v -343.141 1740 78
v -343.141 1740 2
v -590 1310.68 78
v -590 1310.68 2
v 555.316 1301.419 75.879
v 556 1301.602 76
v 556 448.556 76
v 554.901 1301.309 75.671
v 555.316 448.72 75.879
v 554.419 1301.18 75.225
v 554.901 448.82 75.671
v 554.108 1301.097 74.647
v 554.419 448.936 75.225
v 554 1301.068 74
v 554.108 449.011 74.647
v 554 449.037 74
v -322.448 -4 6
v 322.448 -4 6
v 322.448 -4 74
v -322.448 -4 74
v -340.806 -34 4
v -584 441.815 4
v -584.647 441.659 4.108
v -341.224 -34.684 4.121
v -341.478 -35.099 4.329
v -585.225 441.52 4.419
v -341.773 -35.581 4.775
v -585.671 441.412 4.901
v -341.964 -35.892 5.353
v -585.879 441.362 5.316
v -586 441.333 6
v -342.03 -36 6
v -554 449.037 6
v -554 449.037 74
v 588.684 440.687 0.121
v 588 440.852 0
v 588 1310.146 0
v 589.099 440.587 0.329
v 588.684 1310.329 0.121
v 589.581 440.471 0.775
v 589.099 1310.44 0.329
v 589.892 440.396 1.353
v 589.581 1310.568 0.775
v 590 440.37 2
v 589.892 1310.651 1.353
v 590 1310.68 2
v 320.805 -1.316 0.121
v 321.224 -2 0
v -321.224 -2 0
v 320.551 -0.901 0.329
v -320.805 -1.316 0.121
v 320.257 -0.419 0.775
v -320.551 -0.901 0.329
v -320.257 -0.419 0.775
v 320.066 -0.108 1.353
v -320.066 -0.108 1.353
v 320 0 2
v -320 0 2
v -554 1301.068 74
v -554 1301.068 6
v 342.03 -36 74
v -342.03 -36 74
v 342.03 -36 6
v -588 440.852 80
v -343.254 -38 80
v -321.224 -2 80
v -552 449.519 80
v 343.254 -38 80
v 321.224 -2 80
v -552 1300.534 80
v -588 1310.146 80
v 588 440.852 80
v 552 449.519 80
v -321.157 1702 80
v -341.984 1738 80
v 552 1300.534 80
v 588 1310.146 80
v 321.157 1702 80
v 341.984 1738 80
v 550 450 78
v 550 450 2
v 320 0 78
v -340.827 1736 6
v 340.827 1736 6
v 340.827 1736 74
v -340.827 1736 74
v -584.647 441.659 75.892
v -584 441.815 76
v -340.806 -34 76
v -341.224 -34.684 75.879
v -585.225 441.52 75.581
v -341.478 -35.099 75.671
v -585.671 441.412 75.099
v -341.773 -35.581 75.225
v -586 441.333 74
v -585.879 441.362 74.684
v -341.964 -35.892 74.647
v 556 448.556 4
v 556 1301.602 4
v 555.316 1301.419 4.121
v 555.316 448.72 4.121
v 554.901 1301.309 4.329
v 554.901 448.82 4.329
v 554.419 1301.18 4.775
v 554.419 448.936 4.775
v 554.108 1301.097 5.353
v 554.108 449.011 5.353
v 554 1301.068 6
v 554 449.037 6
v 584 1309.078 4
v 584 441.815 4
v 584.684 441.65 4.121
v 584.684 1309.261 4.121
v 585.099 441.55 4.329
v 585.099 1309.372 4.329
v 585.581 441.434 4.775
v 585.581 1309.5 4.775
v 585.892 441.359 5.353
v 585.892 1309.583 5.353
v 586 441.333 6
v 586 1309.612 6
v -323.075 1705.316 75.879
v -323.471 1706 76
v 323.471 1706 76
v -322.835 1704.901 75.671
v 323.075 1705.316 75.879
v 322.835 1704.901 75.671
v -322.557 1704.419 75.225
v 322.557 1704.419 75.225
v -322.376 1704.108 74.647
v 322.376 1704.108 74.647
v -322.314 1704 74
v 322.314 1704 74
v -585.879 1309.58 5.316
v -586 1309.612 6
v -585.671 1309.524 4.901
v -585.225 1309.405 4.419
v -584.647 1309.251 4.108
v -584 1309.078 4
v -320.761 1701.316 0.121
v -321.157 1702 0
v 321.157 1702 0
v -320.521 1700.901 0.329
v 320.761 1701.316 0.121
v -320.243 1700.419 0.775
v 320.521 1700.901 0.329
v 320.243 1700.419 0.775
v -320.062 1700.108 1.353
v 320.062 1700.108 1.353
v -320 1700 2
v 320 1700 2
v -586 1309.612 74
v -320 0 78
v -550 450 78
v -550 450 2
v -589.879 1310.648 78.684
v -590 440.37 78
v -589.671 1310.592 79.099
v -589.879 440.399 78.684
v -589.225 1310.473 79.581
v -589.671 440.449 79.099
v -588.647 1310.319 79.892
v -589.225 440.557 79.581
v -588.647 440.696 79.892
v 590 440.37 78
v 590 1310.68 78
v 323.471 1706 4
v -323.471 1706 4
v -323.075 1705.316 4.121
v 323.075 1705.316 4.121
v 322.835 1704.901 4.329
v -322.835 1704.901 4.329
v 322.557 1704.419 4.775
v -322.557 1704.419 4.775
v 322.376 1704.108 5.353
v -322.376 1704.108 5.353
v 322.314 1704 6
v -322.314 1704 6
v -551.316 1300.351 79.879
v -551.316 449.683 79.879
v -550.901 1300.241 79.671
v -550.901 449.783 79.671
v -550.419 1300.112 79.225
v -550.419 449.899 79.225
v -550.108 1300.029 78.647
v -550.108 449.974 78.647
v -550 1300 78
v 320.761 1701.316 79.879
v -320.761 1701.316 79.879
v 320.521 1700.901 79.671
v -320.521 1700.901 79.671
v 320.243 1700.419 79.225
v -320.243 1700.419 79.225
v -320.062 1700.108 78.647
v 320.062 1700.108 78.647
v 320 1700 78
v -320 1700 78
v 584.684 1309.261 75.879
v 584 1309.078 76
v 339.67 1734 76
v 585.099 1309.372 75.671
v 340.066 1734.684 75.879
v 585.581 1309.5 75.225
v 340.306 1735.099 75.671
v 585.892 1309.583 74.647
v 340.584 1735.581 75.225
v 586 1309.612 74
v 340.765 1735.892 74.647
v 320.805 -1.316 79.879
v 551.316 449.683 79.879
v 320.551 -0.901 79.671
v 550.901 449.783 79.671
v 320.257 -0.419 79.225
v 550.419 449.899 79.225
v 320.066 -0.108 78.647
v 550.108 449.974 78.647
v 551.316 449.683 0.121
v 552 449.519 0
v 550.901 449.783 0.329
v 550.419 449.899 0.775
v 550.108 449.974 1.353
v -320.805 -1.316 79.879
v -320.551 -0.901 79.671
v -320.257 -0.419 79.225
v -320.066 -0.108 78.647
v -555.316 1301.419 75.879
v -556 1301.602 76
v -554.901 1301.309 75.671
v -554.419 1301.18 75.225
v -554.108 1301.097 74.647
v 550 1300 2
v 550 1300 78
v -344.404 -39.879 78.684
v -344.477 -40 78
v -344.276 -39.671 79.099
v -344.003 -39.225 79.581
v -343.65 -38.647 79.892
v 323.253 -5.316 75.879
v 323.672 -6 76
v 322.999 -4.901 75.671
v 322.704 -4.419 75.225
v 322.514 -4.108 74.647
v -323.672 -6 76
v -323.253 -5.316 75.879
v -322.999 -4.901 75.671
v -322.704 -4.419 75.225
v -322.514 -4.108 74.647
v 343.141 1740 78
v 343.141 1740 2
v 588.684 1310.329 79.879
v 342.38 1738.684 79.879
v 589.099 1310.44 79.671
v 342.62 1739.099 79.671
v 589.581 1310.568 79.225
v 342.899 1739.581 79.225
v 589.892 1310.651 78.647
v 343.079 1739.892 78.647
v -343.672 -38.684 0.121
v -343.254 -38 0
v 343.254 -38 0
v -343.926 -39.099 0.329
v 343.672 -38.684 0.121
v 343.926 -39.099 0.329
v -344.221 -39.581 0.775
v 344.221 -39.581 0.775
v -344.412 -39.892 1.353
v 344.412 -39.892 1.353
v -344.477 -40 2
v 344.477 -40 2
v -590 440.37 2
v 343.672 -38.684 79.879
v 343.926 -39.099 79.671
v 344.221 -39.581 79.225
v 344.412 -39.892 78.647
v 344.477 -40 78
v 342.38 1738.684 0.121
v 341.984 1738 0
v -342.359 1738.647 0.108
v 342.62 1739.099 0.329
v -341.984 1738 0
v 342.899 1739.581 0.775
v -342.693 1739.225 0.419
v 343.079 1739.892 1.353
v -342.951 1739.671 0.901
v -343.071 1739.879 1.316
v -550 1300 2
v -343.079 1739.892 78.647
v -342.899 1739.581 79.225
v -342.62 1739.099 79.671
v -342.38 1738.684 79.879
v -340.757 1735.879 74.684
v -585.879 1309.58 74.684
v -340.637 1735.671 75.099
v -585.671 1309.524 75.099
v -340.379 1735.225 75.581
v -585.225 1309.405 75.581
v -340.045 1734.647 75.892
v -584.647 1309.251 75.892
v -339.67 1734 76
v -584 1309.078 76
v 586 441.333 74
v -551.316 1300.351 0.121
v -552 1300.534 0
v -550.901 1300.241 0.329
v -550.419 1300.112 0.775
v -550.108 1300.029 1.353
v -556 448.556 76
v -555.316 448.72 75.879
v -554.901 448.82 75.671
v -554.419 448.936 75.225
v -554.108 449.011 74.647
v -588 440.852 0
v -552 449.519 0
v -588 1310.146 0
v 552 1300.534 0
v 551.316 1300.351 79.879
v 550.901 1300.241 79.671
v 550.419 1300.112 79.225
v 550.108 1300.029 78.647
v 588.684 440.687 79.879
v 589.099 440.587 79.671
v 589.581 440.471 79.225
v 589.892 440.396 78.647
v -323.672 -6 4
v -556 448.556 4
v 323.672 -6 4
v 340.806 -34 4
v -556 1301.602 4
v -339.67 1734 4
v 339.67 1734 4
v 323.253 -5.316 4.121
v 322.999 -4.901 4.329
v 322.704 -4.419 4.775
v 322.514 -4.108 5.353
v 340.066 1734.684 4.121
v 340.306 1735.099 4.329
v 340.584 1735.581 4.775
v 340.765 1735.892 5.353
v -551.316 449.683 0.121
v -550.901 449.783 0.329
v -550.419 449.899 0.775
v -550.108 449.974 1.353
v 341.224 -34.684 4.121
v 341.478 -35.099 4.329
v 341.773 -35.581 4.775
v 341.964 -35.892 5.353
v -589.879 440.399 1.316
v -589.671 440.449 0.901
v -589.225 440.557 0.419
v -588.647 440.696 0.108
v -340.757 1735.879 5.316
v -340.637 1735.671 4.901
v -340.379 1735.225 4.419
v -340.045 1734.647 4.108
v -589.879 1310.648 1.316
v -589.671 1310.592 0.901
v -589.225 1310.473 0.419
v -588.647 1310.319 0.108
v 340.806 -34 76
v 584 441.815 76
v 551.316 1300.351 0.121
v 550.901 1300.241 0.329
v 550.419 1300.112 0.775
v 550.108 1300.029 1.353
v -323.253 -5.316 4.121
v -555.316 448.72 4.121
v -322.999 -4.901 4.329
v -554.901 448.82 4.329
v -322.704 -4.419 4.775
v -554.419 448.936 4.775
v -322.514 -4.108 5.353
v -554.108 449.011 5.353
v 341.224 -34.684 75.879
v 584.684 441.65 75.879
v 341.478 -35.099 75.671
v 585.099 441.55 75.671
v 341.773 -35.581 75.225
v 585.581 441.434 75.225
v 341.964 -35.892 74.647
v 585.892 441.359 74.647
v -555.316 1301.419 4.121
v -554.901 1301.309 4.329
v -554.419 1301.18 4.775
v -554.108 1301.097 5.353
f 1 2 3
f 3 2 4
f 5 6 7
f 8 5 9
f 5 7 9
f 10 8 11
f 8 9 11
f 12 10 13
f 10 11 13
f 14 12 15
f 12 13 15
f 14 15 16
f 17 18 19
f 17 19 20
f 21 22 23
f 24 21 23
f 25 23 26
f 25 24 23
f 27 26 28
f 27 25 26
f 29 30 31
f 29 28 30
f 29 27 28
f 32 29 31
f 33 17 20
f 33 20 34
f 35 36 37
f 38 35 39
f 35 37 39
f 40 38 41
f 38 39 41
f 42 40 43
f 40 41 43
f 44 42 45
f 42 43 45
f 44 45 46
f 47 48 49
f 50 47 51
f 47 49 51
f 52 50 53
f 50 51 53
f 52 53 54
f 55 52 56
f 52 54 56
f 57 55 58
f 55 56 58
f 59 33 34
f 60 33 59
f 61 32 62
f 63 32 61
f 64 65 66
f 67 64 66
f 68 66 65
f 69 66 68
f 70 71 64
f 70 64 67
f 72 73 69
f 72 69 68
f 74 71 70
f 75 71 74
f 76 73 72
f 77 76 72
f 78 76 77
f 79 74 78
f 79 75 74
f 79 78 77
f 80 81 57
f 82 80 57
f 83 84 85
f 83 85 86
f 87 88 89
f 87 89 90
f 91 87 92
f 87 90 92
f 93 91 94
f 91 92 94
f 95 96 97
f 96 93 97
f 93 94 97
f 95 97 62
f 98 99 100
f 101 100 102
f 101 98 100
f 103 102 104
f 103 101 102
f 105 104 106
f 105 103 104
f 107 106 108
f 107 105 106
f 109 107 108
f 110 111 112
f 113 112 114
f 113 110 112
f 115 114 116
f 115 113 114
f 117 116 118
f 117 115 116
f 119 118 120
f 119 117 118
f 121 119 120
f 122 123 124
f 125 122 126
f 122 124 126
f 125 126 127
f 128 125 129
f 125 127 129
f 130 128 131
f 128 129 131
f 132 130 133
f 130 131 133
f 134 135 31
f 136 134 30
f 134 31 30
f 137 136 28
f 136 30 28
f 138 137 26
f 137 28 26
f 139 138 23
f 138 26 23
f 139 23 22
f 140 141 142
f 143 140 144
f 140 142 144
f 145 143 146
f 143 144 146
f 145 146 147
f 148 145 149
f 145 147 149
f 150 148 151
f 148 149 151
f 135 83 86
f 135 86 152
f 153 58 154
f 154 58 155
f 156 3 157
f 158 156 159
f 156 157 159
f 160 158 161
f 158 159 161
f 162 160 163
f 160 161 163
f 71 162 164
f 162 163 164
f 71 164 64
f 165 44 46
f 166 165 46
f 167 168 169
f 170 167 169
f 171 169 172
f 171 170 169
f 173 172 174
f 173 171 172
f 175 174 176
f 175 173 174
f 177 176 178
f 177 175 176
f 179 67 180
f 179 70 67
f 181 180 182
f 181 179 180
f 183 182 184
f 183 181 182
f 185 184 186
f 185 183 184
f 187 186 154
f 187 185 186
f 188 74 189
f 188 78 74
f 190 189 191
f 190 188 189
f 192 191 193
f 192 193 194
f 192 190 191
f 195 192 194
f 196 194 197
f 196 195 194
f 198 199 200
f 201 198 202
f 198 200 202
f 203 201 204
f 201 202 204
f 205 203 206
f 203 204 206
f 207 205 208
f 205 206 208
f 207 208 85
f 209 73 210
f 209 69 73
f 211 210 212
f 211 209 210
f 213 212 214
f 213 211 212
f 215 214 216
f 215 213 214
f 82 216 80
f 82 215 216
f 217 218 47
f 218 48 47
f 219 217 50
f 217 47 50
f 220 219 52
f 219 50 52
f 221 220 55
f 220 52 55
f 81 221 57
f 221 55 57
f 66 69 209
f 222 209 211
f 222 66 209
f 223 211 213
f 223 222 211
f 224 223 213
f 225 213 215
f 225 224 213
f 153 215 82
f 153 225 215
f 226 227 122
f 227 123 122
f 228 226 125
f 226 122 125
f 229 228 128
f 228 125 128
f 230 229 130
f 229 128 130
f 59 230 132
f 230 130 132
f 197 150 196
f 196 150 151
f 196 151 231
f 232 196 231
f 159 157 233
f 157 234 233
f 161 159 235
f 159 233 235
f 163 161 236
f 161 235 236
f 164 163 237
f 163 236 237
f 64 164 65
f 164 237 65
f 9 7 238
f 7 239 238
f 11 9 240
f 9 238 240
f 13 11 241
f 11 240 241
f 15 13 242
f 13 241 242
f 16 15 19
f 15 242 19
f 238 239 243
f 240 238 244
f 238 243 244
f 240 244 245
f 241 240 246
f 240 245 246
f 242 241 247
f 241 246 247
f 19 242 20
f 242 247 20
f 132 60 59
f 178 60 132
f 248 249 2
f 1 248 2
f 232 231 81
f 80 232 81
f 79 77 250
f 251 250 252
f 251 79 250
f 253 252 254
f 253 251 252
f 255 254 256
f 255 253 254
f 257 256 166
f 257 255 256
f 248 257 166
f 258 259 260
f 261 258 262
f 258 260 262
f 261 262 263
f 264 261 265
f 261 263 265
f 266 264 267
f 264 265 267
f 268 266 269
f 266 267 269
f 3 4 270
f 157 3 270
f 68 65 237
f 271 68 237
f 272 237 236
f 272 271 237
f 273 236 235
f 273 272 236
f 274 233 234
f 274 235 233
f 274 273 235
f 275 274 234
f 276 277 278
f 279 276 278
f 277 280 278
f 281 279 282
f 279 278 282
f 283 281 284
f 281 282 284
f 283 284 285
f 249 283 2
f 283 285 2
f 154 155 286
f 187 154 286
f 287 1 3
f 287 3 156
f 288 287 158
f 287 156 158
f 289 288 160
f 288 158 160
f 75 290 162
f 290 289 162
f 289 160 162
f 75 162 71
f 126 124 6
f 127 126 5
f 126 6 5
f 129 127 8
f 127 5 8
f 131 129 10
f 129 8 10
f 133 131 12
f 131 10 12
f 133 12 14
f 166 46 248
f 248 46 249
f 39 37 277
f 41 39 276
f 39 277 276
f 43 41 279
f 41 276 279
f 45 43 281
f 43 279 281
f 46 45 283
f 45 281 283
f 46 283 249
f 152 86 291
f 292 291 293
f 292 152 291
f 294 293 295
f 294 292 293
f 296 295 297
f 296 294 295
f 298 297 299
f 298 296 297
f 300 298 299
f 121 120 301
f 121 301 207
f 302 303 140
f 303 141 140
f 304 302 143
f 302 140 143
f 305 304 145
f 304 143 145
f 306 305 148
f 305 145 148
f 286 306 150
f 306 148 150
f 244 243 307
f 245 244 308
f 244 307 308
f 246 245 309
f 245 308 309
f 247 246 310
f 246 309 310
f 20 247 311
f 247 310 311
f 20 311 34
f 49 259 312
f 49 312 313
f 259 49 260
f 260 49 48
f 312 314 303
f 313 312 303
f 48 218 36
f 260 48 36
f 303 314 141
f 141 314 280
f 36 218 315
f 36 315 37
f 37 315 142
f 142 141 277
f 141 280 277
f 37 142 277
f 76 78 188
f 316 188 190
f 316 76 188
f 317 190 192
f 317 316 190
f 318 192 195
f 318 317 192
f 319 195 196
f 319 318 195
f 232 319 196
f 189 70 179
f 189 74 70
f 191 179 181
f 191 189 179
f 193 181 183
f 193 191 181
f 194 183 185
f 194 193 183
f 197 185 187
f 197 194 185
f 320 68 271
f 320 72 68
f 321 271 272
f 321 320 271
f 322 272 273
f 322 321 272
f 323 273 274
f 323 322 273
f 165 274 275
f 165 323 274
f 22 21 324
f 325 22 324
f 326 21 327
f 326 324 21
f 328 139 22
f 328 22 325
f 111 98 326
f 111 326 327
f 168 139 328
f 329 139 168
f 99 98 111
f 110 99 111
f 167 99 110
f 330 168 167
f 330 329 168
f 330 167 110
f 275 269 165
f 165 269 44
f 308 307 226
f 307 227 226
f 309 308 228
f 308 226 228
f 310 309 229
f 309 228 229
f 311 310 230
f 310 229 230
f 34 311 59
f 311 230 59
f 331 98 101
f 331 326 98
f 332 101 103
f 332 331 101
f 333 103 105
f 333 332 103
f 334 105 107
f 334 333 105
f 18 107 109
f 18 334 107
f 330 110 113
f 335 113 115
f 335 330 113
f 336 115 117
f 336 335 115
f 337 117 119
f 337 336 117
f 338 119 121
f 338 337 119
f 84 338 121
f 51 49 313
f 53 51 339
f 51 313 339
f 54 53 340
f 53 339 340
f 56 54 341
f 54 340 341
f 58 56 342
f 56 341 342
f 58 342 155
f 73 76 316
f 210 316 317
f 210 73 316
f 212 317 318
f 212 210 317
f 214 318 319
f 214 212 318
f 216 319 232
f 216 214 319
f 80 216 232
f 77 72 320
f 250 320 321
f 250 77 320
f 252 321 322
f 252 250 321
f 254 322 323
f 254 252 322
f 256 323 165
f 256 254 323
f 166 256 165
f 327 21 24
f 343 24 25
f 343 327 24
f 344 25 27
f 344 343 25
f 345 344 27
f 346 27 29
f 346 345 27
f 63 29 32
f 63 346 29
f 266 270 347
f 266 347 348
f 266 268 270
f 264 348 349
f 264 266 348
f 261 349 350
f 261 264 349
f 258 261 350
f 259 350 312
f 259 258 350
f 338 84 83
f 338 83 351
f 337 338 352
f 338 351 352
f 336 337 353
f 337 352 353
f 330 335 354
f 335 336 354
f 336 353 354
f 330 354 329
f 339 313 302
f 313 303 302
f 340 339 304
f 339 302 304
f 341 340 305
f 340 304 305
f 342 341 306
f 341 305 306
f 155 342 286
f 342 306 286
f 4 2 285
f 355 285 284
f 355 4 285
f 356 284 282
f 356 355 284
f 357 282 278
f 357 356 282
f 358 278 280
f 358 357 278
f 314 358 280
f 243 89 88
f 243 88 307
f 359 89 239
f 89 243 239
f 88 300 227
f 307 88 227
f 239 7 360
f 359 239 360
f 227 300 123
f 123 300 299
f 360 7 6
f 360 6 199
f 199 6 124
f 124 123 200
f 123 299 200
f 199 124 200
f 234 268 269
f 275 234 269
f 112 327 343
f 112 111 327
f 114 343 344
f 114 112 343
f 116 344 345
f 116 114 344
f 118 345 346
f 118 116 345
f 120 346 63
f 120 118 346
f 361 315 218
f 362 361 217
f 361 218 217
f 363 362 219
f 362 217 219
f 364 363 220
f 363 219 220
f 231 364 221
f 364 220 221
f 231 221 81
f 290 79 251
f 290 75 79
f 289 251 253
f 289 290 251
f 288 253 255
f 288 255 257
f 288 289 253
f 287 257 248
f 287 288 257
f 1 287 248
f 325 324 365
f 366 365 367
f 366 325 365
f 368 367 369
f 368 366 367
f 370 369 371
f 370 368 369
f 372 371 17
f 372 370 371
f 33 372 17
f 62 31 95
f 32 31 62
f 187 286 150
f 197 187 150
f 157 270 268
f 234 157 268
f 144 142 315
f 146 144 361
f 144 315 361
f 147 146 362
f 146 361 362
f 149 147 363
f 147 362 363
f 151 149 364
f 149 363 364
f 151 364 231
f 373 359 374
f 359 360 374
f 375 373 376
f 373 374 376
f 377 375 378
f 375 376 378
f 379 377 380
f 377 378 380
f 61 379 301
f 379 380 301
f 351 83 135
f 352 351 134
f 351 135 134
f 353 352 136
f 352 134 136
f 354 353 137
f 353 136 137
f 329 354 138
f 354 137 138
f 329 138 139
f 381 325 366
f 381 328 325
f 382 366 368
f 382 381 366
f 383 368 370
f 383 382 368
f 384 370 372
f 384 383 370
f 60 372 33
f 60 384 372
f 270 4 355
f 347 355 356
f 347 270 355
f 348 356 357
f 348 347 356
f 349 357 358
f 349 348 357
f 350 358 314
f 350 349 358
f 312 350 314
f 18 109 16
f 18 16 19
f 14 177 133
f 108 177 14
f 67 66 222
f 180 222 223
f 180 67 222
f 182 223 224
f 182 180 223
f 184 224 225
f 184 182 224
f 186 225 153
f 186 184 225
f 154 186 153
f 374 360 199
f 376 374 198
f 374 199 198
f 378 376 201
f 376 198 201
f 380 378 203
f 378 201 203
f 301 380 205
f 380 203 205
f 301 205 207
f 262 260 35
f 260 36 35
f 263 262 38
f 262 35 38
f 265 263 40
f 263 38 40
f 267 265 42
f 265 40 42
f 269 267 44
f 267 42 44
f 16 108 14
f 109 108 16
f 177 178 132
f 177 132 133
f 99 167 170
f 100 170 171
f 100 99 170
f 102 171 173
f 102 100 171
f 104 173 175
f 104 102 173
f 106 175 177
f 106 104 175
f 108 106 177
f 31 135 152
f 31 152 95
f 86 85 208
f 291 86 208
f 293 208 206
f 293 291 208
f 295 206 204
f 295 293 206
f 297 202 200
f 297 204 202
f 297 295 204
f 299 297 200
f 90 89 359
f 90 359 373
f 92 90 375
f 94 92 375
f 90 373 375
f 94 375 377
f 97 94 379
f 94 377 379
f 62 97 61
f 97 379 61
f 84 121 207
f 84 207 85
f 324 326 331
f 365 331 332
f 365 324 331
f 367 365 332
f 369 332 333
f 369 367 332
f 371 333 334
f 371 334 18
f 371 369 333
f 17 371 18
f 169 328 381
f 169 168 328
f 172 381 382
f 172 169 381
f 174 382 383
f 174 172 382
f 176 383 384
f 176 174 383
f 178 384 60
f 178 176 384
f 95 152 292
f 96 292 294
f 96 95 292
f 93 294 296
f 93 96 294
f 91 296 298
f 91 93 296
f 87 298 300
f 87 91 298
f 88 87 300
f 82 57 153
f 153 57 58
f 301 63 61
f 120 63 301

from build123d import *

# Parameters (mm, degrees)
BOSS_EXTRU_1_DEPTH = 80
COQUE1_START       = 4
COQUE1_DEPTH       = 72
CONG_1_R           = 2


# Read off the part's stored shape, not the designer's step: Coque1
with BuildPart() as part:
    # Esquisse1 → Boss.-Extru.1 (new body)
    with BuildSketch(Plane.XY):
        Polygon((-590, 1310.680153009), (-590, 440.370234654), (-344.477435621, -40), (344.477435621, -40), (590, 440.370234654), (590, 1310.680153009), (343.14108798, 1740), (-343.14108798, 1740), align=None)
        Polygon((-320, 1700), (320, 1700), (550, 1300), (550, 450), (320, 0), (-320, 0), (-550, 450), (-550, 1300), align=None, mode=Mode.SUBTRACT)
    extrude(amount=BOSS_EXTRU_1_DEPTH)

    # Coque1 outline → Coque1 (cut)
    with BuildSketch(Plane.XY.offset(COQUE1_START)):
        Polygon((-340.826979182, 1736), (-586, 1309.612137708), (-586, 441.333211189), (-342.029692059, -36), (342.029692059, -36), (586, 441.333211189), (586, 1309.612137708), (340.826979182, 1736), align=None)
        Polygon((-554, 449.037023465), (-554, 1301.068015301), (-322.314108798, 1704), (322.314108798, 1704), (554, 1301.068015301), (554, 449.037023465), (322.447743562, -4), (-322.447743562, -4), align=None, mode=Mode.SUBTRACT)
    extrude(amount=COQUE1_DEPTH, mode=Mode.SUBTRACT)

    # Congé1
    cong_1_edges = [part.edges().sort_by_distance(p)[0] for p in [
        (-467.238717811, 200.185117327, 80),
        (-590, 875.525193832, 0),
        (-466.57054399, 1525.340076505, 0),
        (0, -40, 80),
        (467.238717811, 200.185117327, 80),
        (590, 875.525193832, 80),
        (466.57054399, 1525.340076505, 80),
        (0, 1740, 80),
        (-435, 1500, 0),
        (-550, 875, 0),
        (-435, 225, 0),
        (0, 0, 0),
        (435, 225, 0),
        (550, 875, 0),
        (435, 1500, 0),
        (0, 1700, 0),
        (-435, 1500, 80),
        (-550, 875, 80),
        (-435, 225, 80),
        (0, 0, 80),
        (435, 225, 80),
        (550, 875, 80),
        (435, 1500, 80),
        (0, 1700, 80),
        (-466.57054399, 1525.340076505, 80),
        (-463.413489591, 1522.806068854, 76),
        (-586, 875.472674449, 76),
        (-464.01484603, 202.666605594, 76),
        (0, -36, 76),
        (464.01484603, 202.666605594, 76),
        (586, 875.472674449, 76),
        (463.413489591, 1522.806068854, 76),
        (0, 1736, 76),
        (0, 1704, 4),
        (-438.157054399, 1502.53400765, 4),
        (-554, 875.052519383, 4),
        (-438.223871781, 222.518511733, 4),
        (0, -4, 4),
        (438.223871781, 222.518511733, 4),
        (554, 875.052519383, 4),
        (438.157054399, 1502.53400765, 4),
        (-463.413489591, 1522.806068854, 4),
        (-586, 875.472674449, 4),
        (-464.01484603, 202.666605594, 4),
        (0, -36, 4),
        (464.01484603, 202.666605594, 4),
        (586, 875.472674449, 4),
        (463.413489591, 1522.806068854, 4),
        (0, 1736, 4),
        (-438.157054399, 1502.53400765, 76),
        (-554, 875.052519383, 76),
        (-438.223871781, 222.518511733, 76),
        (0, -4, 76),
        (438.223871781, 222.518511733, 76),
        (554, 875.052519383, 76),
        (438.157054399, 1502.53400765, 76),
        (0, 1704, 76),
        (-590, 875.525193832, 80),
        (0, 1740, 0),
        (466.57054399, 1525.340076505, 0),
        (590, 875.525193832, 0),
        (467.238717811, 200.185117327, 0),
        (0, -40, 0),
        (-467.238717811, 200.185117327, 0),
    ]]
    fillet(cong_1_edges, radius=CONG_1_R)


solid = part.part
